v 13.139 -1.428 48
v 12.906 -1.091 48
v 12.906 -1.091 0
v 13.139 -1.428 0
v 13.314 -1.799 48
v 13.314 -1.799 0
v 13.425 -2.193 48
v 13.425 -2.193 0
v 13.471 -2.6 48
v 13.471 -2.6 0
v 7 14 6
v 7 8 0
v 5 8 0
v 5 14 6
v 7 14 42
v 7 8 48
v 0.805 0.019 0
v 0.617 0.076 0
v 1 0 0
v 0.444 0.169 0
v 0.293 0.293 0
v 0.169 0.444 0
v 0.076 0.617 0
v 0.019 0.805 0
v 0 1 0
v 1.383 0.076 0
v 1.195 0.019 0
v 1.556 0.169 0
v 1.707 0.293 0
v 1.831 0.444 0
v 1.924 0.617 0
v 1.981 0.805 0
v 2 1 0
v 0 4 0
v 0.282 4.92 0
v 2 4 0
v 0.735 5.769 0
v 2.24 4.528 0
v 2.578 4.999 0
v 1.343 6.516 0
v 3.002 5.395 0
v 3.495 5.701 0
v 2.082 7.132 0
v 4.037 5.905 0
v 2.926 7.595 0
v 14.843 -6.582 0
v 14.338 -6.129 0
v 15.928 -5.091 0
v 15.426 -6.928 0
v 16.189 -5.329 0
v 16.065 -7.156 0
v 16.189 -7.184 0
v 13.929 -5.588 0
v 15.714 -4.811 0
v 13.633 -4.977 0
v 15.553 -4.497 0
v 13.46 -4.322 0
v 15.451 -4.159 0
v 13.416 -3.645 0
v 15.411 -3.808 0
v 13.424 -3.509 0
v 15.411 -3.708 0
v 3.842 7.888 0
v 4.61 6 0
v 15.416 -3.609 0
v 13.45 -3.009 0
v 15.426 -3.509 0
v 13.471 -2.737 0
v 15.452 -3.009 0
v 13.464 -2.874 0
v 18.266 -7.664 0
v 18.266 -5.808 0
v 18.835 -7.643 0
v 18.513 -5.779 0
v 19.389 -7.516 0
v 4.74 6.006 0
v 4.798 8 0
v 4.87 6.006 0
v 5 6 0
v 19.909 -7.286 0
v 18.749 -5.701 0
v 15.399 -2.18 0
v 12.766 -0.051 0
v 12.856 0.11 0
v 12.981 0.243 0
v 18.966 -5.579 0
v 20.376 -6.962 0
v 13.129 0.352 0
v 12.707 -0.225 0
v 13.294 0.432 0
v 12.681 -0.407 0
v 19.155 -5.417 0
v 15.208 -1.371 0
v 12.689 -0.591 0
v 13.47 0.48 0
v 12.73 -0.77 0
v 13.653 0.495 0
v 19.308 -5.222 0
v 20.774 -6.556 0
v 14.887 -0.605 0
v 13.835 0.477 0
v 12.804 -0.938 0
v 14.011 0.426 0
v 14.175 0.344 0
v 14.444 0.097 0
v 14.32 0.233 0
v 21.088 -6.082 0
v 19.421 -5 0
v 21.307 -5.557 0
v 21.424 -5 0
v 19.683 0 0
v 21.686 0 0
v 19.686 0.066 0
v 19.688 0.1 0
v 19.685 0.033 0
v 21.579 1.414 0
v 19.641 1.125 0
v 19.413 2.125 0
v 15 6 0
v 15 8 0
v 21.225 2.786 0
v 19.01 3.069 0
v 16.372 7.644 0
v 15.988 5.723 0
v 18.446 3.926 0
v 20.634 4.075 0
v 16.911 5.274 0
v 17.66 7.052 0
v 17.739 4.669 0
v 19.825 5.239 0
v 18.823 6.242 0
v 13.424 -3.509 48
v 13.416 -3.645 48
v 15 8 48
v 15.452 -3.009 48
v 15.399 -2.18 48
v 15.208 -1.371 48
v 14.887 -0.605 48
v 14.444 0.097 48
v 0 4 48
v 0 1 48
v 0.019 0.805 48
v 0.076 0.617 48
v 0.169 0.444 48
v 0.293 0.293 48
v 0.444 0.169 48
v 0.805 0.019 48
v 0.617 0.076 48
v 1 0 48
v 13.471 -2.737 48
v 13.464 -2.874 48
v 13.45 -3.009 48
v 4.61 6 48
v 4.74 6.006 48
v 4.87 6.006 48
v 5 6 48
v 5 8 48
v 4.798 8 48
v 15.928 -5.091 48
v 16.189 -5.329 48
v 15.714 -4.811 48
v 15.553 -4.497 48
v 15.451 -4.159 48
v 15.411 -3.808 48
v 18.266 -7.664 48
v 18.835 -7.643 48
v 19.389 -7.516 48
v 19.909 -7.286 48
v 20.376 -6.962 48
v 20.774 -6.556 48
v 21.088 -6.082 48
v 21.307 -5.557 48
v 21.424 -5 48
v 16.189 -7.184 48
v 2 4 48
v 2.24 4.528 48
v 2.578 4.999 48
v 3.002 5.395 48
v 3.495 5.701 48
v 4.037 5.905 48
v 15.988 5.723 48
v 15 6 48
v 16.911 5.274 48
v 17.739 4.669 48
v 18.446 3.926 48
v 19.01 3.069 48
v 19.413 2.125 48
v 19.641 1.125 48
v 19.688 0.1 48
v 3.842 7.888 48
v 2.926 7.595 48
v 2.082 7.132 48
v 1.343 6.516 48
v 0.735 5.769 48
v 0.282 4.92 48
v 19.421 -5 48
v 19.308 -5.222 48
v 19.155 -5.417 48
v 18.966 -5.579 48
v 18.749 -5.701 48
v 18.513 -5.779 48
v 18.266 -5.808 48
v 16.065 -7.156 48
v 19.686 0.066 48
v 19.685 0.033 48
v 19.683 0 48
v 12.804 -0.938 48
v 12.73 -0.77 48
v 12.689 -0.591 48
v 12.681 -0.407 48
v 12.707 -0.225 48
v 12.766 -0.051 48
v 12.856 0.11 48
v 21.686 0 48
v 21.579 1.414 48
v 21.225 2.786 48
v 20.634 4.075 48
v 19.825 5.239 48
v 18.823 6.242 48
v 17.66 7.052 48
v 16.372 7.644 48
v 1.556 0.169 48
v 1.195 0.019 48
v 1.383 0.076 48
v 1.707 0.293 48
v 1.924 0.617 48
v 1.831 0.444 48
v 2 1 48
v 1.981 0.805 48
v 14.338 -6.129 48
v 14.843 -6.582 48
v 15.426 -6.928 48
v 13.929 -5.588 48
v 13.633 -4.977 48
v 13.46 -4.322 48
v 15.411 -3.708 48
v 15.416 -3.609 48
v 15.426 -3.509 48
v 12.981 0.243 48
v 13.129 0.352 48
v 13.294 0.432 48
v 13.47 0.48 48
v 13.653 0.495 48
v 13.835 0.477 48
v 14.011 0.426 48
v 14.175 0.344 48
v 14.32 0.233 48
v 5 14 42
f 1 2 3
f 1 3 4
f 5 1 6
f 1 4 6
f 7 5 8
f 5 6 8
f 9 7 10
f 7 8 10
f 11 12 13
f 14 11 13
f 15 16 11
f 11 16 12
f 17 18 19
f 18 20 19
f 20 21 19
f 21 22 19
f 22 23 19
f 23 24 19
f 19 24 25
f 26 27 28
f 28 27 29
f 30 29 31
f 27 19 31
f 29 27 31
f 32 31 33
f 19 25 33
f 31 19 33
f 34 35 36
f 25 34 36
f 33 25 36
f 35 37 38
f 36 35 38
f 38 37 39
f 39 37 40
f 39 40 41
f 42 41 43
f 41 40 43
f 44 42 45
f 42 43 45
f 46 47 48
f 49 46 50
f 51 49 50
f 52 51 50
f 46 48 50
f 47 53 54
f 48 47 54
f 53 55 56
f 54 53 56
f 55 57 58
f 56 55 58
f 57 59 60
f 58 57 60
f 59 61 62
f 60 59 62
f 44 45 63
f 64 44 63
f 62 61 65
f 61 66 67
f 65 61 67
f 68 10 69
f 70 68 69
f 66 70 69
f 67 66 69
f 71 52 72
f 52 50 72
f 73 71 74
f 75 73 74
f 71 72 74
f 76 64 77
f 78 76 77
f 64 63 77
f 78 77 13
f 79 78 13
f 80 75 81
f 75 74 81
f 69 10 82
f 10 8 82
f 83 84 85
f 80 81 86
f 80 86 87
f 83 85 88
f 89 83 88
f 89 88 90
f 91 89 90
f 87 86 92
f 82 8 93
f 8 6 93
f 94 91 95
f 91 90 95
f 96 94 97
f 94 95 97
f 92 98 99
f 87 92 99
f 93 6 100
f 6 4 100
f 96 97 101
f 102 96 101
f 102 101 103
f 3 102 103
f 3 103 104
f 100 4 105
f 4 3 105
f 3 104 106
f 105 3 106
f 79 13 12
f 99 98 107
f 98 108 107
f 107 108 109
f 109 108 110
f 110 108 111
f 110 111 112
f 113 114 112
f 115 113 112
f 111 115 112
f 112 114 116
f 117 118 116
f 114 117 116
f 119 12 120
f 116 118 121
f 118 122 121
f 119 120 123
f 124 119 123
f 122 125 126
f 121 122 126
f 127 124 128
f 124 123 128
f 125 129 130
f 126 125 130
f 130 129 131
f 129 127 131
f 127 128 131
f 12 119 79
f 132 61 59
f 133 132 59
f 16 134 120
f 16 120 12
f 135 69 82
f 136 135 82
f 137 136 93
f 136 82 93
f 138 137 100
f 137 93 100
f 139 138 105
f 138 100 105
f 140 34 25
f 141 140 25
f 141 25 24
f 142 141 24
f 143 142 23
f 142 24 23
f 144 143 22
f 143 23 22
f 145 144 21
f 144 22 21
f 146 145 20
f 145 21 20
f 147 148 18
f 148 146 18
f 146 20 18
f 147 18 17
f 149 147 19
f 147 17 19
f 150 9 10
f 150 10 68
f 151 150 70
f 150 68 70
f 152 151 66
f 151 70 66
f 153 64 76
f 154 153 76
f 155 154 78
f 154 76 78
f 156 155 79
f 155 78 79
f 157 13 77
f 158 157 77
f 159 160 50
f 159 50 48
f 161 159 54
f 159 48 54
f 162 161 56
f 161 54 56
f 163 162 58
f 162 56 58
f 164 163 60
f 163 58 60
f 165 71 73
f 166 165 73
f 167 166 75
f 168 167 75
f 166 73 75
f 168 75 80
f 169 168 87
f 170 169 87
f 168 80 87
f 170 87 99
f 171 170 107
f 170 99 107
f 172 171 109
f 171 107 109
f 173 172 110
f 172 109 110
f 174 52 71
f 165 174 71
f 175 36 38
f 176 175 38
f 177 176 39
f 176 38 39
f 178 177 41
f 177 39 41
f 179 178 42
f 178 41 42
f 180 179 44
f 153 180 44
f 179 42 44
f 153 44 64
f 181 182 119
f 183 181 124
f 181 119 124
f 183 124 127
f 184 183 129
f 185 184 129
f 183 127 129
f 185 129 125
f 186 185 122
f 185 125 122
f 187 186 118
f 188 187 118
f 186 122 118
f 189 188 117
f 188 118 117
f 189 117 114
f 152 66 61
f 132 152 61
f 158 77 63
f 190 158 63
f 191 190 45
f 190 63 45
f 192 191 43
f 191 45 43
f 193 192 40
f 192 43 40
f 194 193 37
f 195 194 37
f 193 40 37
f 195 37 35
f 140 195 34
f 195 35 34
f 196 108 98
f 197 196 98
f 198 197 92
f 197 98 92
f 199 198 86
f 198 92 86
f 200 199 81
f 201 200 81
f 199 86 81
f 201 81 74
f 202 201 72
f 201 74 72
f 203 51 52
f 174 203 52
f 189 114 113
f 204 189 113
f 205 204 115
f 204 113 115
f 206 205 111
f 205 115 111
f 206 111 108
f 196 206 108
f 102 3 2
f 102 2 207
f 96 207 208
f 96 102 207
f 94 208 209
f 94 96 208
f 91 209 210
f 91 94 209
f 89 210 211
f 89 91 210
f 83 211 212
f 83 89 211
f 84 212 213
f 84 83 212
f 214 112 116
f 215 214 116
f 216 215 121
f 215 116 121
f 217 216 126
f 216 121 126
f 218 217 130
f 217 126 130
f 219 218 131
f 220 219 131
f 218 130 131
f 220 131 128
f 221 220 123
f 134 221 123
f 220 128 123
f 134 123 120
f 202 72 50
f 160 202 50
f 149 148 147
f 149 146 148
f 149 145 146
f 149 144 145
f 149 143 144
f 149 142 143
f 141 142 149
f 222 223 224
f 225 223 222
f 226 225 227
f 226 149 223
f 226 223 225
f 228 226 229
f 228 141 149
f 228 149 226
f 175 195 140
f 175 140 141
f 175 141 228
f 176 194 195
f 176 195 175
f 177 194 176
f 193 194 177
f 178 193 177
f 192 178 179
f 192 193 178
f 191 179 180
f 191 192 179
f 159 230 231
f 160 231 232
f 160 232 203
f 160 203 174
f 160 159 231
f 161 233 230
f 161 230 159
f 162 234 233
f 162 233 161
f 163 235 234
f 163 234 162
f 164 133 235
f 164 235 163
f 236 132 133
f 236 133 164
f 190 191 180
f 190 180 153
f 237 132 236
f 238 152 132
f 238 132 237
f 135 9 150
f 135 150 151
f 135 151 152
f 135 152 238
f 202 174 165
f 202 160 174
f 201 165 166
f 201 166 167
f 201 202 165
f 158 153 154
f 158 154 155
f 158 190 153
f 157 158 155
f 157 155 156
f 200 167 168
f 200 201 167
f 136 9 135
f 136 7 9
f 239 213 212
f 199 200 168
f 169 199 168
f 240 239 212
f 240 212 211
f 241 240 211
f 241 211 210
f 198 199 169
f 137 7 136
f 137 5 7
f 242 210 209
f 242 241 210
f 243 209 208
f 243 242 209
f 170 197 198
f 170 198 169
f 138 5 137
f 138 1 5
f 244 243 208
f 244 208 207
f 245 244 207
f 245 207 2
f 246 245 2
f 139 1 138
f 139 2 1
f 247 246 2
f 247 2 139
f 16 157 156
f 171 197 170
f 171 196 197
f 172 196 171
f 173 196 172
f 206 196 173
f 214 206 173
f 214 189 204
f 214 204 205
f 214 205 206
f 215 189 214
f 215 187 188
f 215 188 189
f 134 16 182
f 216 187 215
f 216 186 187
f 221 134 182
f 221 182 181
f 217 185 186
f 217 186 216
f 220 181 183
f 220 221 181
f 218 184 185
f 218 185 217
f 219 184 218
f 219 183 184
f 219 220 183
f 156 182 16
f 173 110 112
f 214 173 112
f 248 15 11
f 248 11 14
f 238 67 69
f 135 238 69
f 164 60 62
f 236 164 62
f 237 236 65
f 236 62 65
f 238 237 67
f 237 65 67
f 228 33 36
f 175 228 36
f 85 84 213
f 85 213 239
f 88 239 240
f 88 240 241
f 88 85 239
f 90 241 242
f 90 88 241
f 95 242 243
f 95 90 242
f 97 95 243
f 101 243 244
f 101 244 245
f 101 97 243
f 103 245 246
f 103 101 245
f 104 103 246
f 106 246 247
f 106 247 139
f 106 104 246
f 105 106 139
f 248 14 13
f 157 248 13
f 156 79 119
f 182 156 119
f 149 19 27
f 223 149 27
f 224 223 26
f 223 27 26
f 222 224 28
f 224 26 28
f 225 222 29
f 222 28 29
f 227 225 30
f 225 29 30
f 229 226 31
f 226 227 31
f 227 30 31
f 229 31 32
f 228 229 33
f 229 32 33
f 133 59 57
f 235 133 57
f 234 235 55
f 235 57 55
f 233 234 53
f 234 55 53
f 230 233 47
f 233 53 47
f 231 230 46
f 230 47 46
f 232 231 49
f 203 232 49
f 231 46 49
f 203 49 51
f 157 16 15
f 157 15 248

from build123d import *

# Parameters (mm, degrees)
F1_DEPTH    = 48
F2_SIZE     = 6
F3_T1_DEPTH = 53
F3_T3_DEPTH = 54.5281651471
F3_T5_DEPTH = 52.4600037496


# Not quite as in the source:
# - a fillet or chamfer that OpenCascade refuses, or shapes differently, is made with other operations: its cross-section is extruded or revolved along the edge and cut away or added
# - a feature names something its author has since deleted; it is built from what else it names


with BuildPart() as f1:
    # F0 (on Top) → F1 (new body)
    with BuildSketch(Plane.XY):
        with BuildLine():
            Line((0, 4), (0, 0))
            Line((0, 0), (2, 0))
            Line((2, 0), (2, 4))
            ThreePointArc((2, 4), (3.0020118724, 5.3950578705), (4.6095750202, 6))
            ThreePointArc((4.6095750202, 6), (4.8047875101, 6.0064362795), (5, 6))
            Line((5, 6), (15, 6))
            ThreePointArc((15, 6), (18.4461762663, 3.9255722455), (19.6880345723, 0.0997168751))
            ThreePointArc((19.6880345723, 0.0997168751), (19.6856381883, 0.0498470868), (19.6828086323, 0))
            Line((19.6828086323, 0), (19.4207697359, -5))
            ThreePointArc((19.4207697359, -5), (18.9661763427, -5.5793756098), (18.26629109, -5.8084866821))
            Line((18.26629109, -5.8084866821), (16.1894012844, -5.3289988895))
            ThreePointArc((16.1894012844, -5.3289988895), (15.6261580996, -4.6575642289), (15.4106099526, -3.8080900476))
            ThreePointArc((15.4106099526, -3.8080900476), (15.4127500759, -3.6584901874), (15.4262591199, -3.5094861471))
            Line((15.4262591199, -3.5094861471), (15.4524630095, -3.0094861471))
            ThreePointArc((15.4524630095, -3.0094861471), (14.9662231771, -0.7637354985), (13.5283299865, 1.0285502831))
            Line((13.5283299865, 1.0285502831), (12.346313856, -0.5859939341))
            ThreePointArc((12.346313856, -0.5859939341), (12.5114130289, -0.7045010308), (12.6663410631, -0.8360265911))
            ThreePointArc((12.6663410631, -0.8360265911), (13.2467923067, -1.6369828382), (13.4711592073, -2.6003695984))
            ThreePointArc((13.4711592073, -2.6003695984), (13.4688331774, -2.8053678054), (13.4497183175, -3.0094861471))
            Line((13.4497183175, -3.0094861471), (13.4235144279, -3.5094861471))
            Line((13.4235144279, -3.5094861471), (13.4164237789, -3.6447837895))
            ThreePointArc((13.4164237789, -3.6447837895), (14.1205058655, -5.8682370303), (16.0652377732, -7.1556739049))
            Line((16.0652377732, -7.1556739049), (16.1894012844, -7.1843393101))
            Line((16.1894012844, -7.1843393101), (18.26629109, -7.6638271027))
            ThreePointArc((18.26629109, -7.6638271027), (20.3764129686, -6.9618705168), (21.4235144279, -5))
            Line((21.4235144279, -5), (21.6855533243, 0))
            ThreePointArc((21.6855533243, 0), (19.8249274325, 5.2386247512), (15, 8))
            Line((15, 8), (7, 8))
            Line((7, 8), (7, 14))
            Line((7, 14), (5, 14))
            Line((5, 14), (5, 8))
            Line((5, 8), (4.7983737082, 8))
            ThreePointArc((4.7983737082, 8), (1.6976247354, 6.8415893063), (0, 4))
        make_face()
    extrude(amount=F1_DEPTH)

    # F2
    f2_edges = [f1.edges().sort_by_distance(p)[0] for p in [
        (6, 14, 48),
        (6, 14, 0),
    ]]
    chamfer(f2_edges, length=F2_SIZE)

    # F3: fillet of radius 1 on 4 edges, made by hand

    # F3_s2 → F3_t1 (cut)
    with BuildSketch(Plane.XY.offset(-2.5)):
        with BuildLine():
            ThreePointArc((0, 1), (0.2928932188, 0.2928932188), (1, 0))
            Line((1, 0), (0, 0))
            Line((0, 0), (0, 1))
        make_face()
        with BuildLine():
            ThreePointArc((1, 0), (1.7071067812, 0.2928932188), (2, 1))
            Line((2, 1), (2, 0))
            Line((2, 0), (1, 0))
        make_face()
    extrude(amount=F3_T1_DEPTH, mode=Mode.SUBTRACT)

    # F3_s4 → F3_t3 (cut)
    with BuildSketch(Plane.XY.offset(-3.2640825735)):
        with BuildLine():
            ThreePointArc((12.8383454605, 0.0860838499), (13.6381253577, 0.495339622), (14.4436338584, 0.0974775525))
            ThreePointArc((14.4436338584, 0.0974775525), (14.0164512092, 0.5929671699), (13.5283299865, 1.0285502831))
            Line((13.5283299865, 1.0285502831), (12.8383454605, 0.0860838499))
        make_face()
    extrude(amount=F3_T3_DEPTH, mode=Mode.SUBTRACT)

    # F3_s6 → F3_t5 (cut)
    with BuildSketch(Plane.XY.offset(-2.2300018748)):
        with BuildLine():
            ThreePointArc((12.9064405307, -1.0905635453), (12.6804805888, -0.4840892178), (12.8732356835, 0.1337412433))
            Line((12.8732356835, 0.1337412433), (12.346313856, -0.5859939341))
            ThreePointArc((12.346313856, -0.5859939341), (12.6455057343, -0.8170439967), (12.9064405307, -1.0905635453))
        make_face()
    extrude(amount=F3_T5_DEPTH, mode=Mode.SUBTRACT)


solid = f1.part
